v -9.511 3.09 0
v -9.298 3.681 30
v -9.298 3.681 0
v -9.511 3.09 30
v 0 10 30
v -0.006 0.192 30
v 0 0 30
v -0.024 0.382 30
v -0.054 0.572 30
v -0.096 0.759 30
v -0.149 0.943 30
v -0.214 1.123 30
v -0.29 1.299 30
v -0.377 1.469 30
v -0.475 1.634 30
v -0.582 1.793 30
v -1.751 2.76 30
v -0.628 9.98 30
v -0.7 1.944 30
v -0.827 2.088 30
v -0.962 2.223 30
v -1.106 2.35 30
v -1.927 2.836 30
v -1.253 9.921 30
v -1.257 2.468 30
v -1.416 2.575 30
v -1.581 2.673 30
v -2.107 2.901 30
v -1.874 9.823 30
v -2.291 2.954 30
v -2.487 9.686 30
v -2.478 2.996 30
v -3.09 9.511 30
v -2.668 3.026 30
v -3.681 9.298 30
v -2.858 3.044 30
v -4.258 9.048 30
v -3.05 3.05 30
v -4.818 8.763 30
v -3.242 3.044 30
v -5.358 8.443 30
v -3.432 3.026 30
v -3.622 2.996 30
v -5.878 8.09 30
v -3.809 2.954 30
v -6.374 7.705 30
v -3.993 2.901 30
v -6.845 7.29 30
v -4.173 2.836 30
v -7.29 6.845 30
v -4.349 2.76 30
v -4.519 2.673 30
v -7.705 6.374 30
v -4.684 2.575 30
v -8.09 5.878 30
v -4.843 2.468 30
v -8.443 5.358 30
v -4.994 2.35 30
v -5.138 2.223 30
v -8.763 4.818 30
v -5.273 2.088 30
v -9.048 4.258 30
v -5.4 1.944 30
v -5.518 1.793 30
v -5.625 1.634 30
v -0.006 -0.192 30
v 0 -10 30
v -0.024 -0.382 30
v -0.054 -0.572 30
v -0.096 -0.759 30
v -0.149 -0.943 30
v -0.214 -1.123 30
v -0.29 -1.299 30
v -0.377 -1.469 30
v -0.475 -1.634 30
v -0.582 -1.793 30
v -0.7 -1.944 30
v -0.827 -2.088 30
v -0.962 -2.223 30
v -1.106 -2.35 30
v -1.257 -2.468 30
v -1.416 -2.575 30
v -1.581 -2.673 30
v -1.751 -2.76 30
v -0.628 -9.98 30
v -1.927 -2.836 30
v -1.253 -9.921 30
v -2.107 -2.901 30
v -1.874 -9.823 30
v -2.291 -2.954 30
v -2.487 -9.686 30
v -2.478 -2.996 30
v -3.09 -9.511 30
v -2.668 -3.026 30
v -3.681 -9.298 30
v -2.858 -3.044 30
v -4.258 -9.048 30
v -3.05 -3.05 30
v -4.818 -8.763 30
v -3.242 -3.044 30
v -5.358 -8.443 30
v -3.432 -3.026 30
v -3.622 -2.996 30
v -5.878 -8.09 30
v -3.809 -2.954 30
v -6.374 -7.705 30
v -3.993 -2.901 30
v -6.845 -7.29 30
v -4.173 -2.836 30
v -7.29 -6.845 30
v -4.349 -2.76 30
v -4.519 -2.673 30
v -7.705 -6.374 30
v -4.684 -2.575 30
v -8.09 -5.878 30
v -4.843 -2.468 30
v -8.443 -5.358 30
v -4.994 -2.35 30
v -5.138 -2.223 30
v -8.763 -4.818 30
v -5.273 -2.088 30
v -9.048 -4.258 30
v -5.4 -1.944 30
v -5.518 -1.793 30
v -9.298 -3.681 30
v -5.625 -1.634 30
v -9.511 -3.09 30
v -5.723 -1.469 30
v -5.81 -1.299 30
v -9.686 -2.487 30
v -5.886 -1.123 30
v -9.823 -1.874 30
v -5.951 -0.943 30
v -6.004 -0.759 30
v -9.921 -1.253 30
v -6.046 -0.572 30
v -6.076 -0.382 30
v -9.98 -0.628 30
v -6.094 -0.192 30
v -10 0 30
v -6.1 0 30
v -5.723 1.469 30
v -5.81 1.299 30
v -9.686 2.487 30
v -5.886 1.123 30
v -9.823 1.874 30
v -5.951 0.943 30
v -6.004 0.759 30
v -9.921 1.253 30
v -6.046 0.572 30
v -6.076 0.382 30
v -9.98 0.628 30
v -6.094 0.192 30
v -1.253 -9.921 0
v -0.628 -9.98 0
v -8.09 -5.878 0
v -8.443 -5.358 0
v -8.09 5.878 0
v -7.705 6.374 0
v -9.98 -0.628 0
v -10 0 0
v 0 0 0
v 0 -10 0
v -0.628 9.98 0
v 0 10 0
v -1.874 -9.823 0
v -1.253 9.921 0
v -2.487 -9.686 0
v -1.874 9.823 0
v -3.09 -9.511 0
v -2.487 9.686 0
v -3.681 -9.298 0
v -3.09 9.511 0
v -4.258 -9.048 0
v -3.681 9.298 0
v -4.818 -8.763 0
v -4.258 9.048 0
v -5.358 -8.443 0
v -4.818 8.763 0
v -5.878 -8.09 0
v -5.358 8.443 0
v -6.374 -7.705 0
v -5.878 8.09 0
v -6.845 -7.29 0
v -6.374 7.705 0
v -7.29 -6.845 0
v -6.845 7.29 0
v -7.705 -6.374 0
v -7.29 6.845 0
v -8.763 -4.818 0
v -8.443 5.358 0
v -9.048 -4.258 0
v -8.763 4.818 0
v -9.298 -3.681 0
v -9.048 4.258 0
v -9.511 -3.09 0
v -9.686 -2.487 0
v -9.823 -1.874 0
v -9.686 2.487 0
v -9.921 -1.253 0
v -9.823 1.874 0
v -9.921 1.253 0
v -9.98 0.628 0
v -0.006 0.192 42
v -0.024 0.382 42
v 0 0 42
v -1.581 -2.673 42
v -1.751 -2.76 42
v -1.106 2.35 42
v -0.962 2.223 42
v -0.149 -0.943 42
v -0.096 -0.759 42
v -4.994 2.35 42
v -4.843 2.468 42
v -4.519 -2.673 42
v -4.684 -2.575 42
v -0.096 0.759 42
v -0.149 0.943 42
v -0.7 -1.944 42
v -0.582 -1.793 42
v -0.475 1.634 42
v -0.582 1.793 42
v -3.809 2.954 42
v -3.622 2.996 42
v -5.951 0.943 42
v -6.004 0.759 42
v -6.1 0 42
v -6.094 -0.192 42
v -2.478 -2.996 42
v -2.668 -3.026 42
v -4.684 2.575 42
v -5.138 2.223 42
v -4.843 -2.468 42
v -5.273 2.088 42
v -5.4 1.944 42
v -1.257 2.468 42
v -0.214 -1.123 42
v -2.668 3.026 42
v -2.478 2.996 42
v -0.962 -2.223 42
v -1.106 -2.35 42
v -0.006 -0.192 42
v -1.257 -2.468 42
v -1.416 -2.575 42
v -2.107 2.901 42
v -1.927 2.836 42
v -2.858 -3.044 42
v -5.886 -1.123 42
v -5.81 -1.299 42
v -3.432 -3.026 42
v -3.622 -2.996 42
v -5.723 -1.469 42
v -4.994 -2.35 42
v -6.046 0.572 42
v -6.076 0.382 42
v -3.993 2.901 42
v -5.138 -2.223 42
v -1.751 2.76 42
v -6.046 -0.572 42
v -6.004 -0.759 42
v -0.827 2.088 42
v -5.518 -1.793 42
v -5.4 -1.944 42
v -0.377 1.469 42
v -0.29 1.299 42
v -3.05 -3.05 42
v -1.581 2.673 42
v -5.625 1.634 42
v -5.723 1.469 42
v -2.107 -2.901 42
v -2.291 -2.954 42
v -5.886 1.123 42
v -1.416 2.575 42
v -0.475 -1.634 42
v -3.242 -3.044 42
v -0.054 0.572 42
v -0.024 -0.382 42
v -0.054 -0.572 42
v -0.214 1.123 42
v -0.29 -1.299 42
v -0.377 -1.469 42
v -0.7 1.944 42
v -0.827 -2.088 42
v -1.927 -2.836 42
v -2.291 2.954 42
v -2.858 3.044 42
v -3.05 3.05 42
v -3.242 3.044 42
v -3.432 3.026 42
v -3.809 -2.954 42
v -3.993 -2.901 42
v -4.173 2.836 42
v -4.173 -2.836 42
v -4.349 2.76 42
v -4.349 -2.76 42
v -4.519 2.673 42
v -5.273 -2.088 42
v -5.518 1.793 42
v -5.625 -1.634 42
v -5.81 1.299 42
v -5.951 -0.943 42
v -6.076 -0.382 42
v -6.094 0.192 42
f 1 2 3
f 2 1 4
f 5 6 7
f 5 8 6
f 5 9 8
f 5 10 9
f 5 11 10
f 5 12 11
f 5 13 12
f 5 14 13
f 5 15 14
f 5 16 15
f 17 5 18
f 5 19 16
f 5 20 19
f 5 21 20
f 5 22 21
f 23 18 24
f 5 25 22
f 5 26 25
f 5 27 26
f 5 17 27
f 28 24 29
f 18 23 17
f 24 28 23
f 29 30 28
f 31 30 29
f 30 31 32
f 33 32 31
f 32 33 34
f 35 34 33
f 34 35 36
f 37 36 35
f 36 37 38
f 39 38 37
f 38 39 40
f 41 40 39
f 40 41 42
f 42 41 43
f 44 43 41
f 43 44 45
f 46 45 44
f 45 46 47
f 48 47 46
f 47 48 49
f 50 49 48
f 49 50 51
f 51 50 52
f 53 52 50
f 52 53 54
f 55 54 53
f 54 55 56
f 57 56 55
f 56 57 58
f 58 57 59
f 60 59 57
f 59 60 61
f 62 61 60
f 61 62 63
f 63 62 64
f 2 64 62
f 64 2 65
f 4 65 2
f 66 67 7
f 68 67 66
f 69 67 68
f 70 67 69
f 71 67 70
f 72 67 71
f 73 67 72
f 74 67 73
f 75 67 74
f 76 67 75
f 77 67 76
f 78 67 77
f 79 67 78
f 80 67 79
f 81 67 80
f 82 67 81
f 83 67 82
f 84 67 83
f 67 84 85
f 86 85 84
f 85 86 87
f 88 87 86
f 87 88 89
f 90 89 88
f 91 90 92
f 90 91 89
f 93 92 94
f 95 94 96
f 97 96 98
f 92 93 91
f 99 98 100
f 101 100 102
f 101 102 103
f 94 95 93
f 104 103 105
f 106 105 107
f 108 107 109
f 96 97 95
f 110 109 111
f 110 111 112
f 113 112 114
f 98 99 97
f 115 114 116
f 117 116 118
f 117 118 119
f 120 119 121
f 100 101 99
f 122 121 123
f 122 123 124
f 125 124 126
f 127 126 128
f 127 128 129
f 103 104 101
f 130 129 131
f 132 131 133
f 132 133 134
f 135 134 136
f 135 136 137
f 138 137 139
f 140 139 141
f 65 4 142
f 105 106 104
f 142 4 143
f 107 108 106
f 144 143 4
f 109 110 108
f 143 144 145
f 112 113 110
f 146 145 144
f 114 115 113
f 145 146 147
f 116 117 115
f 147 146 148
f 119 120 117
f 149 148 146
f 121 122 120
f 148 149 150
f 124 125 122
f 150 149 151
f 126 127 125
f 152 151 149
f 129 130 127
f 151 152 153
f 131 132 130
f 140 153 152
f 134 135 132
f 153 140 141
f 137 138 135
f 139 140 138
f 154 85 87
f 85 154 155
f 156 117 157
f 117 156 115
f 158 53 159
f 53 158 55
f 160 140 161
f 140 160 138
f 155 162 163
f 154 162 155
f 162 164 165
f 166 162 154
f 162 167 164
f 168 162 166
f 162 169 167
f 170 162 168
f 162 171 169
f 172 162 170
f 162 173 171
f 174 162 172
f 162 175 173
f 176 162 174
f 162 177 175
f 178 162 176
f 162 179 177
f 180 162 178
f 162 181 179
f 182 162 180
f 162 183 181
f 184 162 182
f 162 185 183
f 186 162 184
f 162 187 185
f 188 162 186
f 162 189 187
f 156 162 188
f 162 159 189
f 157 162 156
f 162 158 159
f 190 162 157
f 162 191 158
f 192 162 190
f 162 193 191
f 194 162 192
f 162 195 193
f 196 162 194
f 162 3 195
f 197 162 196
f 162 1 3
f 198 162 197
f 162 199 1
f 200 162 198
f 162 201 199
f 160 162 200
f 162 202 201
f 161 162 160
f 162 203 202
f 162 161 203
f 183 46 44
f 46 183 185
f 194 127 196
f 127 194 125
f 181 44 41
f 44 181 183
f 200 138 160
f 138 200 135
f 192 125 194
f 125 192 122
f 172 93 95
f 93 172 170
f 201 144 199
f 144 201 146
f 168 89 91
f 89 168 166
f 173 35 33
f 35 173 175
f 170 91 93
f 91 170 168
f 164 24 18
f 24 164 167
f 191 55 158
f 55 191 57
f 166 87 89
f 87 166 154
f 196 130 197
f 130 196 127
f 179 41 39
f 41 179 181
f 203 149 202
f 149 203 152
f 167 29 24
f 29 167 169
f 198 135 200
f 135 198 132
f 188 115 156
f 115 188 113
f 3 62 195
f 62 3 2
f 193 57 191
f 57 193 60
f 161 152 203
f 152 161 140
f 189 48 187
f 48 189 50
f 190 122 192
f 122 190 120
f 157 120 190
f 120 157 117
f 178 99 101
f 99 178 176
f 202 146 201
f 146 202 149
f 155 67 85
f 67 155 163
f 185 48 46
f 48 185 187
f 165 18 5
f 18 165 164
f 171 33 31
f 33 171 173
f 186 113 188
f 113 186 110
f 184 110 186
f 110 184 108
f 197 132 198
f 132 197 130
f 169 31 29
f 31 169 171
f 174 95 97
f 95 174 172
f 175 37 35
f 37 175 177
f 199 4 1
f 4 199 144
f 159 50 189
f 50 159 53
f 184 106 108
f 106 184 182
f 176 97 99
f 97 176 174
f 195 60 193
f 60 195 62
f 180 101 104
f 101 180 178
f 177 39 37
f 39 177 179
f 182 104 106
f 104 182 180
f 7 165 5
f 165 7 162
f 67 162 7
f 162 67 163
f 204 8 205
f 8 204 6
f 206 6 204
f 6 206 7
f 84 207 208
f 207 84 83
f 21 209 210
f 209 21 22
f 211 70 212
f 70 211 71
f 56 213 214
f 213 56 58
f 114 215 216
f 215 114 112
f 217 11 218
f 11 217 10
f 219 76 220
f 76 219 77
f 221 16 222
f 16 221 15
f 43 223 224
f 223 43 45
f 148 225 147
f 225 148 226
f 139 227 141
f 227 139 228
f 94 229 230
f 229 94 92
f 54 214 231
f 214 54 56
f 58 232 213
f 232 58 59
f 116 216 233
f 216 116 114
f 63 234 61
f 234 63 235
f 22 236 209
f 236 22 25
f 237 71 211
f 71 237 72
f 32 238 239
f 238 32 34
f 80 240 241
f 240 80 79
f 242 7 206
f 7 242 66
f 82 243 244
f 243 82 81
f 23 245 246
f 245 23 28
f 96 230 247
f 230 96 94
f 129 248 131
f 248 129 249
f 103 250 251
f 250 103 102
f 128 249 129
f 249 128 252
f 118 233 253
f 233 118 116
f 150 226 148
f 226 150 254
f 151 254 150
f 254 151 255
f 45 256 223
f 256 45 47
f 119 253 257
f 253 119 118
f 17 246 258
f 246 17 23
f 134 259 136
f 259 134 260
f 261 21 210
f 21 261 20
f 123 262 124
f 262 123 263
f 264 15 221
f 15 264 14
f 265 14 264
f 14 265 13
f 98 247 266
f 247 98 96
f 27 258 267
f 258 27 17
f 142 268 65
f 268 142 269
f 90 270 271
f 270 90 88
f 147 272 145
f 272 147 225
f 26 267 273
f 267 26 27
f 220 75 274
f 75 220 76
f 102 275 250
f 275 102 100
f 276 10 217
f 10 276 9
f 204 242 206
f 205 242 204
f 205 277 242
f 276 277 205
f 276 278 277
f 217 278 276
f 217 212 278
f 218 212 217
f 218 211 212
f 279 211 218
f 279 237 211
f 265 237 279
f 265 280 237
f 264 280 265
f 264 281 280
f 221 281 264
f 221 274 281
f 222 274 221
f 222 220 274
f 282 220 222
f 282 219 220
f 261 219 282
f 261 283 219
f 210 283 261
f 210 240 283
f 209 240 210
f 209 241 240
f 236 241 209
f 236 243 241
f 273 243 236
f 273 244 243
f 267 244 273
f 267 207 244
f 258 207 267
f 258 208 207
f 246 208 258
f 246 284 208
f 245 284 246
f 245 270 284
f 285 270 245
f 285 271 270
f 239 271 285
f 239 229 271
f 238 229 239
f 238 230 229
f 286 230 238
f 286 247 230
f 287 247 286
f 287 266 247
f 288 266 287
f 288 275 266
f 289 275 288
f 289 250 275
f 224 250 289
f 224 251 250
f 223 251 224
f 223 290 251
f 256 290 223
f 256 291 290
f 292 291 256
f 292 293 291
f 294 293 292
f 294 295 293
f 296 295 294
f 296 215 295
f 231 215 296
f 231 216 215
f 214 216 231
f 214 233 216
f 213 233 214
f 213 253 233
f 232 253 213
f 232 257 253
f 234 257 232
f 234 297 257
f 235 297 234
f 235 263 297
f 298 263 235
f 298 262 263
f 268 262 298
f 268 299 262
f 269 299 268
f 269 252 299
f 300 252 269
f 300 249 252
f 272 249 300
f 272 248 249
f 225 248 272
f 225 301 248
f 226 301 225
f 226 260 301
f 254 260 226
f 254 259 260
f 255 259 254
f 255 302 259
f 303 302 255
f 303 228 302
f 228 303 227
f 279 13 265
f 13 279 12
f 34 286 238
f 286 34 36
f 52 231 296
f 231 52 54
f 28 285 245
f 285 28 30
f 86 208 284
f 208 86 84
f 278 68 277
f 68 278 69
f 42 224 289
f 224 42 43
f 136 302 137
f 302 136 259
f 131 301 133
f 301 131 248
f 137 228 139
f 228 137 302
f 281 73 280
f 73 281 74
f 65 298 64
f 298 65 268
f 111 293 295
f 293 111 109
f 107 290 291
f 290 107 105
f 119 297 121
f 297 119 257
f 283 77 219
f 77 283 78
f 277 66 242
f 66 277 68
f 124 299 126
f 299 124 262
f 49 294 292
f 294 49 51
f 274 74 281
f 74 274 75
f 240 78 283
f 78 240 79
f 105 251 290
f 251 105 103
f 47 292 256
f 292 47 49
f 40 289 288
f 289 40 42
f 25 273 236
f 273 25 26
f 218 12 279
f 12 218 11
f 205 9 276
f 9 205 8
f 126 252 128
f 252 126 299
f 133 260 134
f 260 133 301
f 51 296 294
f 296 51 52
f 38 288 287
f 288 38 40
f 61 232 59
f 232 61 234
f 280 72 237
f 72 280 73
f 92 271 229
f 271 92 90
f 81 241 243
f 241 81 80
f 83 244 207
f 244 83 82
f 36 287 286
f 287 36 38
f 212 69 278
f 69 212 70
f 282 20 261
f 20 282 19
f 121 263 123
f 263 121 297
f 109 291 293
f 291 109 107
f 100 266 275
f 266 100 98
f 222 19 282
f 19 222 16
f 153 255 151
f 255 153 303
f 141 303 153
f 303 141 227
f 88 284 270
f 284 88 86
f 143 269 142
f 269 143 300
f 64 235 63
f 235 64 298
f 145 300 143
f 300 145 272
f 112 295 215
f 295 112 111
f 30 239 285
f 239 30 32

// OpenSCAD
// This makes a simple shelf holder made up of a spoke that fits into a drill hole and a tab that holds up a shelf.

//radius of spoke in mm
rad=3.05;
//height of spoke in mm
hs=12;
//radius of tab
rt=10;
// height of tab in mm
ht=30;
$fn=100;

union(){
    translate([-rad,0,0])cylinder(r=rad,h=hs+ht);
    difference(){
    cylinder(r=rt, h=ht);
    translate([0,-rt,-1])cube([2*rt+2,2*rt+2,hs+ht]);
}
}
